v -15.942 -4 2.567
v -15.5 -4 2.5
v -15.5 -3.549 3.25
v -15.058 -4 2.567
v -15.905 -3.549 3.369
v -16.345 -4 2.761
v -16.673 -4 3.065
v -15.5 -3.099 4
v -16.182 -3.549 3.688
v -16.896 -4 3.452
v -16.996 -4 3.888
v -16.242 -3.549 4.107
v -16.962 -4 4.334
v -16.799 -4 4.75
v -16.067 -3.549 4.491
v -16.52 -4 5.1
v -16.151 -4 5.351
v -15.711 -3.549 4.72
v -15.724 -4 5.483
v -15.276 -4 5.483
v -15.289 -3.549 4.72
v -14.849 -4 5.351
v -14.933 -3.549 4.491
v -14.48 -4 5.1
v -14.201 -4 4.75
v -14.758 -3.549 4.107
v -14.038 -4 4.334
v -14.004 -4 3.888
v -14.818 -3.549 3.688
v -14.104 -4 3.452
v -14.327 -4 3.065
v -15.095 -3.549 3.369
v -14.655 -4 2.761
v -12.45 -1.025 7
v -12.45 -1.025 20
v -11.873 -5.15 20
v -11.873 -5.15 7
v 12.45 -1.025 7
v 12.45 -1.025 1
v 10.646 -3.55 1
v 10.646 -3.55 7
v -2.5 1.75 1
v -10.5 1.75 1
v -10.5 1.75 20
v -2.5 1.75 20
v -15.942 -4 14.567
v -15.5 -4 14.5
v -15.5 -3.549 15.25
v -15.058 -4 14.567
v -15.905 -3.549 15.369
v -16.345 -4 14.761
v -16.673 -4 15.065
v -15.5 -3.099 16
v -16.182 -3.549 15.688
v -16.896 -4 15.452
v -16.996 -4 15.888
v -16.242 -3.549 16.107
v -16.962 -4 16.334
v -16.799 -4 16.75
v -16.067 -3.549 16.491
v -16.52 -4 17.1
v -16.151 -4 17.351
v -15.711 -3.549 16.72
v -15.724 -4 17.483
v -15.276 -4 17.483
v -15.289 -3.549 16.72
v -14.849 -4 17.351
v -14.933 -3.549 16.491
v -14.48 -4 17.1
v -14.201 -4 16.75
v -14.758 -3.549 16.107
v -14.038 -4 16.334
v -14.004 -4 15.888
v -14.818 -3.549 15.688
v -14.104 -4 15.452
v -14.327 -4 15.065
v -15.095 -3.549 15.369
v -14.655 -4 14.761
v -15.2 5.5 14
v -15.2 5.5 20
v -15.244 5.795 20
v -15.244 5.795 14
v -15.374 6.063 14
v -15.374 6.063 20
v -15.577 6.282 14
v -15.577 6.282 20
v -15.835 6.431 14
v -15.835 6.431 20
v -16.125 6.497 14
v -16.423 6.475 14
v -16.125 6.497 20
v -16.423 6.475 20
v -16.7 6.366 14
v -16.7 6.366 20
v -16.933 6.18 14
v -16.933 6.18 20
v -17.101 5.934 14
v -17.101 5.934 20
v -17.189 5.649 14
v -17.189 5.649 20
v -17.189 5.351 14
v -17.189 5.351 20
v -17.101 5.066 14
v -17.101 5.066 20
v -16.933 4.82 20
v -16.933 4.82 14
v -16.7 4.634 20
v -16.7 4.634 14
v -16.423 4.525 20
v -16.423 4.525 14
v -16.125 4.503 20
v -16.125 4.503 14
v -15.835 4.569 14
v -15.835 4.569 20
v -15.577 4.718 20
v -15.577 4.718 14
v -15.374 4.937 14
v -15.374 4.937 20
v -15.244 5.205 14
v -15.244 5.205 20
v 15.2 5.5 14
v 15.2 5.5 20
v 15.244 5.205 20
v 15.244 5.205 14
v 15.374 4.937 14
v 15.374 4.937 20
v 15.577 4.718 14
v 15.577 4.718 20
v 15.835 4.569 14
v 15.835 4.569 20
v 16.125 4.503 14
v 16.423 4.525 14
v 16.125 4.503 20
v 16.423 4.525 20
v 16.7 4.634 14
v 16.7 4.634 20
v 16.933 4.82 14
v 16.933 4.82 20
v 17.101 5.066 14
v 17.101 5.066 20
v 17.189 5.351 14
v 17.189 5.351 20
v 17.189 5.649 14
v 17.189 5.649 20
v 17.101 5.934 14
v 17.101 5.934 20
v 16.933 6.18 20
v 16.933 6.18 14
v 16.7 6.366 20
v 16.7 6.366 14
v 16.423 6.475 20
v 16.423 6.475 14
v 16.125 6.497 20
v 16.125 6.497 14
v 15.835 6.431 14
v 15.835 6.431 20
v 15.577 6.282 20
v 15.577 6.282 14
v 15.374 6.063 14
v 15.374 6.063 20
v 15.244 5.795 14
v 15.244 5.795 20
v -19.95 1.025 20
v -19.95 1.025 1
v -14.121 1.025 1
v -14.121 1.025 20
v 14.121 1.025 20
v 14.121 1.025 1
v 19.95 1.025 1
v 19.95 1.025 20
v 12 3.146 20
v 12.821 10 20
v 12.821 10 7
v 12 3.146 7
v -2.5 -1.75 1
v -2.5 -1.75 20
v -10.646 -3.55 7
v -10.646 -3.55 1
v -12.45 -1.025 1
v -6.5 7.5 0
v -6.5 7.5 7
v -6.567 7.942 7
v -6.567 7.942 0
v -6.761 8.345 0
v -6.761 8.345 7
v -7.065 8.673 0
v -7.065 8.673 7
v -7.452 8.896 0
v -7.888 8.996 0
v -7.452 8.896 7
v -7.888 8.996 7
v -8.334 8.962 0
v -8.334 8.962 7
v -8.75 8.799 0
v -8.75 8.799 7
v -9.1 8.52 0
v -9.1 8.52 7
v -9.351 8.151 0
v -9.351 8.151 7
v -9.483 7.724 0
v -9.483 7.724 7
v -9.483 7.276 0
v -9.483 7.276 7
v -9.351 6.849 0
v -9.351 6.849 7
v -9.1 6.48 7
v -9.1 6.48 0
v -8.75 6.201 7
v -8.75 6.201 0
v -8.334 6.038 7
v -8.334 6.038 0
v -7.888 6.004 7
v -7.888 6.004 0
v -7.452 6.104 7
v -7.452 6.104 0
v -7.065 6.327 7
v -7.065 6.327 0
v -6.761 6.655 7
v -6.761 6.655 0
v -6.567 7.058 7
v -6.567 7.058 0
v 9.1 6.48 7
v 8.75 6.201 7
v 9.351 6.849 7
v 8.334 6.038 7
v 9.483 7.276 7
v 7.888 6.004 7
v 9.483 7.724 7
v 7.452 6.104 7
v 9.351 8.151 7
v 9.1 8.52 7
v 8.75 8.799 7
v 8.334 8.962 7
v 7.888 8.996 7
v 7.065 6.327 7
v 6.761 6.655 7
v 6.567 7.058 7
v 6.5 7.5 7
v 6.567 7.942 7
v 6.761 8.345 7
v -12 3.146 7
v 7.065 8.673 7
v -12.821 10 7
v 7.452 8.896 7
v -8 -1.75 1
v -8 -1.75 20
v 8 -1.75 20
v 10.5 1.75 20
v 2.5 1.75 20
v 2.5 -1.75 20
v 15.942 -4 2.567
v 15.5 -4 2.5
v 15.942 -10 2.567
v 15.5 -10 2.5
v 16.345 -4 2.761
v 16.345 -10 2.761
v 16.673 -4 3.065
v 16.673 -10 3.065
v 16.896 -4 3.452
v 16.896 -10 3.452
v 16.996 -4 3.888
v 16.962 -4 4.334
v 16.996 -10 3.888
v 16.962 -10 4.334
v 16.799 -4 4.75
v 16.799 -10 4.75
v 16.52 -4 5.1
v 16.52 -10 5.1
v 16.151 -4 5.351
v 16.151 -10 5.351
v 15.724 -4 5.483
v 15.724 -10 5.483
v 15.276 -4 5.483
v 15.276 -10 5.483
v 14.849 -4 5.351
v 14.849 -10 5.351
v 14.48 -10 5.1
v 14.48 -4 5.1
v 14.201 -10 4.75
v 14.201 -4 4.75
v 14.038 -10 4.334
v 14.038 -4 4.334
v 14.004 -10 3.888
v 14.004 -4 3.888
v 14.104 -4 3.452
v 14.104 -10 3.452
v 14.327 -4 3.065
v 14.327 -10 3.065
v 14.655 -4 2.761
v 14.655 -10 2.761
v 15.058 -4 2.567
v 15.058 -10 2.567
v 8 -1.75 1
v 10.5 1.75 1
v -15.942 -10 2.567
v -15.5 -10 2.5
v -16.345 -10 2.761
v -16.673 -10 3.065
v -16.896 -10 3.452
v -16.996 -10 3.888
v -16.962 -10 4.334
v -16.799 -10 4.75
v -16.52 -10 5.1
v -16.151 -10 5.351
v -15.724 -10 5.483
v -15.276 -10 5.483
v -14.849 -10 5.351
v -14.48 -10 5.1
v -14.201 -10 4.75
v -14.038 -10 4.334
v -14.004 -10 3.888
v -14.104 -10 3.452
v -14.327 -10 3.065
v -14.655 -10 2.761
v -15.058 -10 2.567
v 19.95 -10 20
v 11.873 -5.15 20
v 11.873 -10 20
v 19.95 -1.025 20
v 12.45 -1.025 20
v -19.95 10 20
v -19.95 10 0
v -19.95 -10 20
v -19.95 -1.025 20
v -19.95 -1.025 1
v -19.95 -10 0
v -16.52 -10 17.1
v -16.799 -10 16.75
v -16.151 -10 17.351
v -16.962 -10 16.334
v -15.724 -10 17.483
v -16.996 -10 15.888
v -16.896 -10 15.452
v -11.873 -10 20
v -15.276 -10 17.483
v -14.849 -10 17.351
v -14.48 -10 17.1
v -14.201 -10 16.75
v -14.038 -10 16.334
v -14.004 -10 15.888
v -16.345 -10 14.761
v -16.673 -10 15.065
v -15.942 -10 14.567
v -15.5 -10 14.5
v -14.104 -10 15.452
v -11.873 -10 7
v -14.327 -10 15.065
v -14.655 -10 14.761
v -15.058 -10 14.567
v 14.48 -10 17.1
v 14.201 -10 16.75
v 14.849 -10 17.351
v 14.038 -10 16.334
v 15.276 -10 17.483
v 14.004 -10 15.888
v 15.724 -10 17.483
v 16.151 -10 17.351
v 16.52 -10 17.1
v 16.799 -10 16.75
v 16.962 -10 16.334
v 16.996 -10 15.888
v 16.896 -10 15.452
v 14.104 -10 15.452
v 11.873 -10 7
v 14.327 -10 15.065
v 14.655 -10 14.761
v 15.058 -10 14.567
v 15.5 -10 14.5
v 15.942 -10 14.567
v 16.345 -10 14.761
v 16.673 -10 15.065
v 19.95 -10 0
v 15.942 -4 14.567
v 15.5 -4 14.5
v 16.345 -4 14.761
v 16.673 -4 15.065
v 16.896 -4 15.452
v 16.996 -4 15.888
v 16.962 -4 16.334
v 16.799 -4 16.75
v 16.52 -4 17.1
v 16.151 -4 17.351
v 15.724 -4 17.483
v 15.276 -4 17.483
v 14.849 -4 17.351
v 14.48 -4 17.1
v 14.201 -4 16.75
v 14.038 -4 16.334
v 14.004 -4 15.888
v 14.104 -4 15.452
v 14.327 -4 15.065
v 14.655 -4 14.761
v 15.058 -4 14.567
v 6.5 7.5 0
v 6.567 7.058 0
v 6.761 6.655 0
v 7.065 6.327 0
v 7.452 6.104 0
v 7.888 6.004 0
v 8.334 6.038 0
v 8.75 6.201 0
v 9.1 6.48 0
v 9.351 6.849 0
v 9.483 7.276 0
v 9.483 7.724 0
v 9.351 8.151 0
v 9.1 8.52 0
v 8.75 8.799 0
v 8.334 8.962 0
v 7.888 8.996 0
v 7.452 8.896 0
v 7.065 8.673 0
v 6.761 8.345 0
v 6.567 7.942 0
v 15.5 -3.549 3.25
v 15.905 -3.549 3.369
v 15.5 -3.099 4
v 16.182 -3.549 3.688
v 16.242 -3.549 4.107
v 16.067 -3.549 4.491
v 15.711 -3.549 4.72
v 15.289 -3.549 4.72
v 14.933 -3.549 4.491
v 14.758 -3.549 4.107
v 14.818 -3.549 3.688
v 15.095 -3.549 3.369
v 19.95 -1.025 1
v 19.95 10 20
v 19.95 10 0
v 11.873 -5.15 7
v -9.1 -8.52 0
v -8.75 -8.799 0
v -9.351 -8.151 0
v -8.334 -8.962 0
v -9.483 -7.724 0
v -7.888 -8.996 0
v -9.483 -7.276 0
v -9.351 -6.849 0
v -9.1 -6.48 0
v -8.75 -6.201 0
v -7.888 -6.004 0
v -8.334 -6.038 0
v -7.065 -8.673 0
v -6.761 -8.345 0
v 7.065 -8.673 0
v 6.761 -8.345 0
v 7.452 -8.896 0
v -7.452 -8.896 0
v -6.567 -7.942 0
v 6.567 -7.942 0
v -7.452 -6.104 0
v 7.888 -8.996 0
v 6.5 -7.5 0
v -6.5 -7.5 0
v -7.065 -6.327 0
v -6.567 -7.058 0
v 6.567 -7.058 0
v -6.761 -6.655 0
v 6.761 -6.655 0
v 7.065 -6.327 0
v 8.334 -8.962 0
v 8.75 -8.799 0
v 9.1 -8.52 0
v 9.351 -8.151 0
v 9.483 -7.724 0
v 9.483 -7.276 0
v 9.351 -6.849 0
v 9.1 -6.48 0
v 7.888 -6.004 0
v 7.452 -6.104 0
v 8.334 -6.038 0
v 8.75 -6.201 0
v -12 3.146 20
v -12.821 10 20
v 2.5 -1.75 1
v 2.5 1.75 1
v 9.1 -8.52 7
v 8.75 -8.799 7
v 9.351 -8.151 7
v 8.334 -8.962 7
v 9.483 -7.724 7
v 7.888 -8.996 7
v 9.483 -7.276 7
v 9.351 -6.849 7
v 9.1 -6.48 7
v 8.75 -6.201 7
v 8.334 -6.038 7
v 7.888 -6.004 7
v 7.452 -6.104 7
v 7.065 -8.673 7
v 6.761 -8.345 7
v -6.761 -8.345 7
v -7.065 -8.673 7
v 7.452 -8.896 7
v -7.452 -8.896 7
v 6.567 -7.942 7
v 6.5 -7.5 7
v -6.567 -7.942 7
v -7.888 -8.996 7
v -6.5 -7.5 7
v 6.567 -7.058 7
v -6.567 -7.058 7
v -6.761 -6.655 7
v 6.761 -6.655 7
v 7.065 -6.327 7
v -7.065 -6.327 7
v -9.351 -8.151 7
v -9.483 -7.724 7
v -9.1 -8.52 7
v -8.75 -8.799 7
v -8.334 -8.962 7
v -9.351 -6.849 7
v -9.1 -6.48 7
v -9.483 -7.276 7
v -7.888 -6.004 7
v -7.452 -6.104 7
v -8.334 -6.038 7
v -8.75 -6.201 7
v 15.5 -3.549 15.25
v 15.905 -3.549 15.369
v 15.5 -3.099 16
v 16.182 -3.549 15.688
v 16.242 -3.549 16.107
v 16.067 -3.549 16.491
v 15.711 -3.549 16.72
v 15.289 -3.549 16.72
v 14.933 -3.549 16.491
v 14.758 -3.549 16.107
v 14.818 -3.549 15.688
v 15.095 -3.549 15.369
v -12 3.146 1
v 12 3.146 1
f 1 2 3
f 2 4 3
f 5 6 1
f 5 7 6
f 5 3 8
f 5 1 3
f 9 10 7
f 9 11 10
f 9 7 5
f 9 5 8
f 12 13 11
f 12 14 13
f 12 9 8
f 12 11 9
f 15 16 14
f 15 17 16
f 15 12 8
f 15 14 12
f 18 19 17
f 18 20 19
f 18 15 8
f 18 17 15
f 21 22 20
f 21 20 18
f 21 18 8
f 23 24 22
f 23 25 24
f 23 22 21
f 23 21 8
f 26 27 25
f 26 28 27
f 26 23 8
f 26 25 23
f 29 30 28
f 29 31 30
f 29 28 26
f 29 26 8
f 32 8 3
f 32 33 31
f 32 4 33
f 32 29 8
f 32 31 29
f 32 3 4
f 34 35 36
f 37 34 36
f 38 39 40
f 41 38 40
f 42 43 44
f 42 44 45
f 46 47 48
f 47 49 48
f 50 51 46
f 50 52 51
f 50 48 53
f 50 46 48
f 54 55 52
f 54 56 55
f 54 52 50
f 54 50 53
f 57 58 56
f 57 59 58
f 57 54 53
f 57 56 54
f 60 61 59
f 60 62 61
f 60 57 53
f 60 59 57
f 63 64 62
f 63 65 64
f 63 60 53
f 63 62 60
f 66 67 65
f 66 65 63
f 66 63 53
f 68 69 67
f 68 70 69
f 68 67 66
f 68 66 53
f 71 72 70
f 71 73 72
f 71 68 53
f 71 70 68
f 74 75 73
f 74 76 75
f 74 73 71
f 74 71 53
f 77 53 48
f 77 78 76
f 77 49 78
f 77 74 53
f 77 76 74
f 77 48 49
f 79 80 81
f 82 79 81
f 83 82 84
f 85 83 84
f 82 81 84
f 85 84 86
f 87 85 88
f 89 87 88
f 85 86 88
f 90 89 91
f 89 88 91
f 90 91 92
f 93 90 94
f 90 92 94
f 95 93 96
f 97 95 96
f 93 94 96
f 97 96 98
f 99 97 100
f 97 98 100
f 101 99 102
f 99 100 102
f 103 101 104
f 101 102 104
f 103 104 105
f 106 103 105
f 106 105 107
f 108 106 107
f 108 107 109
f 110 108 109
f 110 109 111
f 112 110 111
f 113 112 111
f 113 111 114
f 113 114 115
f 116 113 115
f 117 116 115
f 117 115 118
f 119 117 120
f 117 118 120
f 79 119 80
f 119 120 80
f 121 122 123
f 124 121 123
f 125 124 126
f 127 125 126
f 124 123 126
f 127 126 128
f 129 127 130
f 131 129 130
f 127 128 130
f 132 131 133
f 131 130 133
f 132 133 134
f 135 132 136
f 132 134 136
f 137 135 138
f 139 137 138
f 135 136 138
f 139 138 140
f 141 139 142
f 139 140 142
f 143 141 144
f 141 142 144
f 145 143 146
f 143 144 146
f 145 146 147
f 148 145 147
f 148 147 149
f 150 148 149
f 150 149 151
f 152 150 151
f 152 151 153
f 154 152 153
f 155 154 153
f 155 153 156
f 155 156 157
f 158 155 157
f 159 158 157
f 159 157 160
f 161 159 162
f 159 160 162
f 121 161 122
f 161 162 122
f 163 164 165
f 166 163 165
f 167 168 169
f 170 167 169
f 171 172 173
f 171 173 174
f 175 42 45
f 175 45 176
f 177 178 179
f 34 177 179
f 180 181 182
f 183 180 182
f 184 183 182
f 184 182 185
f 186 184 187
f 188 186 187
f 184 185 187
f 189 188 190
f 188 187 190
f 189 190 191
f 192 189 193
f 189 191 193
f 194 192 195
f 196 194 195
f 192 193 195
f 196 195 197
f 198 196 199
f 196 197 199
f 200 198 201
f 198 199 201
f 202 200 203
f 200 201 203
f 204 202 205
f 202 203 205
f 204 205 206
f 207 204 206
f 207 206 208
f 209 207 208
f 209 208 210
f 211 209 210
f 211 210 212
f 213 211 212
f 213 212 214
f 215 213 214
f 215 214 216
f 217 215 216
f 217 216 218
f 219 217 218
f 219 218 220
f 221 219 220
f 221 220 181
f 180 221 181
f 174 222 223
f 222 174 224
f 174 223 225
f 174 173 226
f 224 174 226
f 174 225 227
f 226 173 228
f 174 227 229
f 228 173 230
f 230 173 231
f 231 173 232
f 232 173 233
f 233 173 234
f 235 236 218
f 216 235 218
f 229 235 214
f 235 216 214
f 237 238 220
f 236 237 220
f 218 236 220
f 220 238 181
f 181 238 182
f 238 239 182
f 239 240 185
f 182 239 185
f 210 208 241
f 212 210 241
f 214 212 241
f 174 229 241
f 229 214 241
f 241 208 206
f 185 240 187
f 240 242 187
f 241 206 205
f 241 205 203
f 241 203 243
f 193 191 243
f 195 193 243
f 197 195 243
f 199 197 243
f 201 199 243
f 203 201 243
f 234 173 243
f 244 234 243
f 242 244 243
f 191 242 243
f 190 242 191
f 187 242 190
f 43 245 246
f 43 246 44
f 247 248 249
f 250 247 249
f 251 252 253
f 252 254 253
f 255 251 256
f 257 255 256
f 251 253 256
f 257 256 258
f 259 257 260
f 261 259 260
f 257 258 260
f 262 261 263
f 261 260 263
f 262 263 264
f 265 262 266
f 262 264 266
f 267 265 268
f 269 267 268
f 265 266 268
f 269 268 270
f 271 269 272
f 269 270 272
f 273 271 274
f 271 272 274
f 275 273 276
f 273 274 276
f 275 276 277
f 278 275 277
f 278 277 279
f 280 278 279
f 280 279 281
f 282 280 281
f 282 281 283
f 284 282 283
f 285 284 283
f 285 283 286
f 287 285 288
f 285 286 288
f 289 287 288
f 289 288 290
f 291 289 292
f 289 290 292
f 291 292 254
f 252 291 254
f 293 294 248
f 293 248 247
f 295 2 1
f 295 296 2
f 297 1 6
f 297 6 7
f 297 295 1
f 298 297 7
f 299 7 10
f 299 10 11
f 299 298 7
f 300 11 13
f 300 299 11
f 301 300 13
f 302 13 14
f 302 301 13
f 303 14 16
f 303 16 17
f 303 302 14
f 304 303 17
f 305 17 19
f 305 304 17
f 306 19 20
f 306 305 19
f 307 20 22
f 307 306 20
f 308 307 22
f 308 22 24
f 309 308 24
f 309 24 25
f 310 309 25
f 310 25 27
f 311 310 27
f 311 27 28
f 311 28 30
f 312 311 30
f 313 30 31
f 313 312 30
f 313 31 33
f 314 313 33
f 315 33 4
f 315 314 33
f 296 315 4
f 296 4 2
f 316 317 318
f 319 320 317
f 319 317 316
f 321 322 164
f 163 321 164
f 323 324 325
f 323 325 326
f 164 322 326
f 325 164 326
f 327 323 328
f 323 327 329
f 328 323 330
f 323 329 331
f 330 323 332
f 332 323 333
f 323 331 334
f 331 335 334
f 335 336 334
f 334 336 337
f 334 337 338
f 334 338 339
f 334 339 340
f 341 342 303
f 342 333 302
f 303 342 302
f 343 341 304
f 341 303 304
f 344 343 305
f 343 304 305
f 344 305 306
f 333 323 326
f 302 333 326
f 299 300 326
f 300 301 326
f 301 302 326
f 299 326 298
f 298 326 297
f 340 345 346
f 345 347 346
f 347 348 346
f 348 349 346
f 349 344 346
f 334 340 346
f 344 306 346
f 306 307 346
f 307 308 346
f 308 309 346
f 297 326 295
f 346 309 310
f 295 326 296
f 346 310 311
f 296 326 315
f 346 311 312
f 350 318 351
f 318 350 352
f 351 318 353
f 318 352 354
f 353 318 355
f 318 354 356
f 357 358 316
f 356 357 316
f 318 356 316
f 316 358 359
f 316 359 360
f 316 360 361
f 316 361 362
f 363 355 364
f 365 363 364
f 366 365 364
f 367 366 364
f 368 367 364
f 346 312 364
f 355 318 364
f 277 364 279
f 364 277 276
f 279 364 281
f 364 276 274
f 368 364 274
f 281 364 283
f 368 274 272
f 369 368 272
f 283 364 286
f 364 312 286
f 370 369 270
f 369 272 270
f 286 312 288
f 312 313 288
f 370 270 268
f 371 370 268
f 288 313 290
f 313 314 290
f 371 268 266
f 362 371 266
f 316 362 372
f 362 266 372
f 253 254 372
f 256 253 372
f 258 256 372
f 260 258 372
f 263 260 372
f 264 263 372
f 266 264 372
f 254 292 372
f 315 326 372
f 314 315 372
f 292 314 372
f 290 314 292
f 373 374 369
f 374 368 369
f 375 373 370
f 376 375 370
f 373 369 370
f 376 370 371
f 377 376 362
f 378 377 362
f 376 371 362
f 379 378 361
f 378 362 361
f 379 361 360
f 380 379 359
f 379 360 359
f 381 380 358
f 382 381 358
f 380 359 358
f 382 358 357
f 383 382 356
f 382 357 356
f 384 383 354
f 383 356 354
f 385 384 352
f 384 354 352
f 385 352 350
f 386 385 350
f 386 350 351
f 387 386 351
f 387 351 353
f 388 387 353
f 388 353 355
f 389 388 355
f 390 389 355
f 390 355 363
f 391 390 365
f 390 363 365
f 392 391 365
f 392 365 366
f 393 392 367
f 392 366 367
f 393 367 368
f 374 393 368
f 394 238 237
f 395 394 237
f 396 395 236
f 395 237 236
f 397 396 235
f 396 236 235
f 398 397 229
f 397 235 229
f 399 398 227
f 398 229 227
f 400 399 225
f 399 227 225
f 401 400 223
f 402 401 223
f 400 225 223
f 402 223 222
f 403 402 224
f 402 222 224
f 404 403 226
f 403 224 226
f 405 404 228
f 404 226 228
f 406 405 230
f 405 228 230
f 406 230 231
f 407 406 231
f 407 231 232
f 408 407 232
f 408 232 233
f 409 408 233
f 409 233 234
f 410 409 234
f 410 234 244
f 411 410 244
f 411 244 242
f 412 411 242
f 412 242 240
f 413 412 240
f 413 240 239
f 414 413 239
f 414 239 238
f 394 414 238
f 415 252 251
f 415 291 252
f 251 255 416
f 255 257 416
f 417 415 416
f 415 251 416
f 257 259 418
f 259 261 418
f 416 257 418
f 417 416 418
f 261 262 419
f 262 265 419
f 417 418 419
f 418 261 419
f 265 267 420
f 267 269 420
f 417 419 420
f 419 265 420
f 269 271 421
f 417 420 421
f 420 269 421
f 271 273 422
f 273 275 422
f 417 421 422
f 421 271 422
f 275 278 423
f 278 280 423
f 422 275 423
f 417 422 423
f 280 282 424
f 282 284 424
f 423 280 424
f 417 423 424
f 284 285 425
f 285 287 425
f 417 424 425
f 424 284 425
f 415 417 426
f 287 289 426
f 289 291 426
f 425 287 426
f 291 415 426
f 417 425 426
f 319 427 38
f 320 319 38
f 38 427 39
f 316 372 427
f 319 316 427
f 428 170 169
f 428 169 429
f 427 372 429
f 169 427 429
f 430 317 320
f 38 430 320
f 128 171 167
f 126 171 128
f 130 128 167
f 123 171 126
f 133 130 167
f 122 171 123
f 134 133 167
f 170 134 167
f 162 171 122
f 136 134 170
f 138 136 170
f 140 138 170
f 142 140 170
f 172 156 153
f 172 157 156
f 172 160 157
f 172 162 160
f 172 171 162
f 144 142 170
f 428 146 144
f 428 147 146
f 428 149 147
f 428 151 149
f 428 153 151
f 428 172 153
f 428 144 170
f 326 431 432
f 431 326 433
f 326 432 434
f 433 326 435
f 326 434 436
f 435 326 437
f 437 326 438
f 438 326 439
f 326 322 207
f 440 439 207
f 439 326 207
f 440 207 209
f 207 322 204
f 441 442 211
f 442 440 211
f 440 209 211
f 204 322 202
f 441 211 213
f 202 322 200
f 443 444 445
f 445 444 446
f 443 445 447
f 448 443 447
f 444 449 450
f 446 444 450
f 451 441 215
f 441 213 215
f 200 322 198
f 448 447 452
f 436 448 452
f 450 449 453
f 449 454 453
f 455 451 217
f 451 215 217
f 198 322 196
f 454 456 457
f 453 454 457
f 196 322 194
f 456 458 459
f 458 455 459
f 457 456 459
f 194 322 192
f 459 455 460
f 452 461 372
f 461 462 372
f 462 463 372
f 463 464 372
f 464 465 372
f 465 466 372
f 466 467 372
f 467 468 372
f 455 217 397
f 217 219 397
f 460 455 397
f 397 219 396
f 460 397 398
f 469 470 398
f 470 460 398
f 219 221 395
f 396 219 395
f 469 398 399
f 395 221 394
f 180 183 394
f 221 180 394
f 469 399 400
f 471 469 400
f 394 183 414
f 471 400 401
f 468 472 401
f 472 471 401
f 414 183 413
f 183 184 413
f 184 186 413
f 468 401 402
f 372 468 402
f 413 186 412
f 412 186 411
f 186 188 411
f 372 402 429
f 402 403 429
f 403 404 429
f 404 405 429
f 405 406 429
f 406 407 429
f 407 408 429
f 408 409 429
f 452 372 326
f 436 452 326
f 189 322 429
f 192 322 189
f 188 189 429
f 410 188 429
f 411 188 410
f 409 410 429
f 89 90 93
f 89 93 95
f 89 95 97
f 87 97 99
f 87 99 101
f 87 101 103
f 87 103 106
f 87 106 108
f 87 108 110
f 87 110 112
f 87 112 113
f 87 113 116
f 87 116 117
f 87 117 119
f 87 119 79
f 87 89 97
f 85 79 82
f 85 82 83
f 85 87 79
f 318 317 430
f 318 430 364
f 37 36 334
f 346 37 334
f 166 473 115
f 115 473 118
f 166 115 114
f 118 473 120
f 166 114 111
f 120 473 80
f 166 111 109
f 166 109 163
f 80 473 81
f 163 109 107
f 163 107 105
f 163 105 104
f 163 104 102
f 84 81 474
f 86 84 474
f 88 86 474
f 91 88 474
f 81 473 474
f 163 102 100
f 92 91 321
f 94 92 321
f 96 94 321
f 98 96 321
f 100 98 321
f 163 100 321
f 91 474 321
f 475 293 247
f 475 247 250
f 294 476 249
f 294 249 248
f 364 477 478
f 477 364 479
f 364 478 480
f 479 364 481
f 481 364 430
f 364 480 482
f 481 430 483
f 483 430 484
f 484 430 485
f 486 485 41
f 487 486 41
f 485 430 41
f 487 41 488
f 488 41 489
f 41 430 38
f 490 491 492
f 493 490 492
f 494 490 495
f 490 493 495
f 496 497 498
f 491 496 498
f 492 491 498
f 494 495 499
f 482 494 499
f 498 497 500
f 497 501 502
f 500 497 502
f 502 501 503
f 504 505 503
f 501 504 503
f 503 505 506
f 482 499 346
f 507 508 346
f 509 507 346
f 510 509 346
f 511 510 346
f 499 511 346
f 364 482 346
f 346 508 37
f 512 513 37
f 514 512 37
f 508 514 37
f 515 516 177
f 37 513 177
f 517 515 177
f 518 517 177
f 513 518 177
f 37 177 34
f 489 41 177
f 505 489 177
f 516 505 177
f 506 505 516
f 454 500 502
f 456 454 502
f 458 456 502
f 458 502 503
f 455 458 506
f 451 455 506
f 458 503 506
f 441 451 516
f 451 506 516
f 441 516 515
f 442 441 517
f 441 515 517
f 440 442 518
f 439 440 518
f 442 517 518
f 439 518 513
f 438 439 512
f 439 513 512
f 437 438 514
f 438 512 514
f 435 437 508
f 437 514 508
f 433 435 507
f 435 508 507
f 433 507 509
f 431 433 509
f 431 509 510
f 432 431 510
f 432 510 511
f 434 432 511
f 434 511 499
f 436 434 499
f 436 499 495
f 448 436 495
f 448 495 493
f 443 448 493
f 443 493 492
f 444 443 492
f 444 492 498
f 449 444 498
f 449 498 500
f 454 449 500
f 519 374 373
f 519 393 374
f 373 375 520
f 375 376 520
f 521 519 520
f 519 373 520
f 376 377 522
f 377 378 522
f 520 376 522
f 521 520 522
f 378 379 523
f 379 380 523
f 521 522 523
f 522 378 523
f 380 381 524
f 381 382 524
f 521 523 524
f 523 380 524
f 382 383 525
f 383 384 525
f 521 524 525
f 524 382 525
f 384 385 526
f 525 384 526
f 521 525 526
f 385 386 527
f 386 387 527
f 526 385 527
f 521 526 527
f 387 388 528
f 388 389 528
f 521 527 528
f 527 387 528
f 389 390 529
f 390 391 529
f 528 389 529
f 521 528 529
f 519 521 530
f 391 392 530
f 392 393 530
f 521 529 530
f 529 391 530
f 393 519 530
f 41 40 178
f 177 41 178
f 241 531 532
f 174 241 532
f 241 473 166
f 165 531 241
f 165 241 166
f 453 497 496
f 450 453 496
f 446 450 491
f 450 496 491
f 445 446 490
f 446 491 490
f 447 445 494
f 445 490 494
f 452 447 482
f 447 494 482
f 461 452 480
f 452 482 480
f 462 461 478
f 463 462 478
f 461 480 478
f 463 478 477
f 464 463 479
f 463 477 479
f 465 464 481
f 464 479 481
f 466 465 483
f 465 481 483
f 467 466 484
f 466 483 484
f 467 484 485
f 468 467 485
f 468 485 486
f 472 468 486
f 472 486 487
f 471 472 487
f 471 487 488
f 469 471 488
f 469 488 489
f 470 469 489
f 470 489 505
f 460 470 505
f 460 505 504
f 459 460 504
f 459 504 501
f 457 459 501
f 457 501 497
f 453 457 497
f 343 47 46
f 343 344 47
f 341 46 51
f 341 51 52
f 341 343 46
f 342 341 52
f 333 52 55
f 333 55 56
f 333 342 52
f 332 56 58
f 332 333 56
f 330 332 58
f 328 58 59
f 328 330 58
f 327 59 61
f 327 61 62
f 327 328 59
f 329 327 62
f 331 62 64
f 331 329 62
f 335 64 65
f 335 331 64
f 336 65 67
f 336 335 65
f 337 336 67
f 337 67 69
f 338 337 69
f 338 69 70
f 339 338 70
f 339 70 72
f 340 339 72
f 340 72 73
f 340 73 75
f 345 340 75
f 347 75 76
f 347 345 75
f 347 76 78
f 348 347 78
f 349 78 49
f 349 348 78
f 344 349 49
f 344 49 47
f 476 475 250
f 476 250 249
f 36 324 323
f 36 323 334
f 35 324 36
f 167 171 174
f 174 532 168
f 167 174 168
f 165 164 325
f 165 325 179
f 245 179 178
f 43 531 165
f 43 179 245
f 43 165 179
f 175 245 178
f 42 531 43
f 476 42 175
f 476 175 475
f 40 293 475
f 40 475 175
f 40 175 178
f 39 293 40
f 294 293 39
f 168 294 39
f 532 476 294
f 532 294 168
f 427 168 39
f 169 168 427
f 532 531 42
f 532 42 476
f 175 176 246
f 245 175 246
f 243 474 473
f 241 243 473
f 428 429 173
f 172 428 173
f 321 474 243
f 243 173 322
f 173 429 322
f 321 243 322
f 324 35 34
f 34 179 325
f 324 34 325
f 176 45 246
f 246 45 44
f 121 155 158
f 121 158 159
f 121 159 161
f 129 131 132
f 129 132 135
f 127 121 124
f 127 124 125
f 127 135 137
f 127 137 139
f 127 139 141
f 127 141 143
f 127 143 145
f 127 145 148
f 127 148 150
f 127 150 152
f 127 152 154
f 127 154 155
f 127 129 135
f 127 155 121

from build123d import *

# Parameters (mm, degrees)
SKETCH_1_W           = 39.9
SKETCH_1_H           = 20
EXTRUDE_1_DEPTH      = 1
EXTRUDE_4_DEPTH      = 19
CUT_EXTRUDE_1_DEPTH  = 13
F_3_0MM_3_AT_2_COUNT = 2
F_3_0MM_3_AT_2_PITCH = 12
EXTRUDE_5_DEPTH      = 13
CUT_EXTRUDE_2_DEPTH  = 13
SKETCH_27_R          = 1
CUT_EXTRUDE_3_DEPTH  = 6
SKETCH_28_R          = 1.5
CUT_EXTRUDE_4_DEPTH  = 26.82639154


with BuildPart() as part:
    # 草图1 → 凸台-拉伸1 (new body)
    with BuildSketch(Plane.XY):
        Rectangle(SKETCH_1_W, SKETCH_1_H)
    extrude(amount=EXTRUDE_1_DEPTH)

    # 草图2 → 凸台-拉伸4 (add)
    with BuildSketch(Plane.XY.offset(1)):
        Polygon((-19.95, 10), (-19.95, 1.025), (-14.121320344, 1.025), (-12, 3.146320344), (0, 3.146320344), (0, 10), align=None)
        Polygon((19.95, 10), (0, 10), (0, 3.146320344), (12, 3.146320344), (14.121320344, 1.025), (19.95, 1.025), align=None)
        Polygon((-8, -1.75), (-10.5, 1.75), (-2.5, 1.75), (-2.5, -1.75), align=None)
        Polygon((2.5, -1.75), (2.5, 1.75), (10.5, 1.75), (8, -1.75), align=None)
        Polygon((-12.45, -1.025), (-19.95, -1.025), (-19.95, -10), (19.95, -10), (19.95, -1.025), (12.45, -1.025), (10.646428571, -3.55), (-10.646428571, -3.55), align=None)
    extrude(amount=EXTRUDE_4_DEPTH)

    # 草图4 → 切除-拉伸1 (cut)
    with BuildSketch(Plane.XY.offset(20)):
        Polygon((-12.45, -1.025), (-11.193517665, -10), (0, -13.387486255), (11.193517665, -10), (12.45, -1.025), (10.646428571, -3.55), (-10.646428571, -3.55), align=None)
        Polygon((-14.121320344, 1.025), (-12.45, 12.563933046), (12.45, 12.563933046), (14.121320344, 1.025), (12, 3.146320344), (-12, 3.146320344), align=None)
    extrude(amount=-CUT_EXTRUDE_1_DEPTH, mode=Mode.SUBTRACT)

    # 草图22 → Ø3.0mm 暗销孔3 (revolve, cut)
    with BuildSketch(Plane(origin=(-15.5, -10, 16), x_dir=(0, 0, -1), z_dir=(1, 0, 0))):
        Polygon((0, 0), (0, 6.901290929), (1.5, 6), (1.5, 0), align=None)
    f_3_0mm_3 = revolve(axis=Axis((-15.5, -16.35, 16), (0, 1, 0)), mode=Mode.SUBTRACT)

    # Ø3.0mm 暗销孔3 at 2: Ø3.0mm 暗销孔3 ×2
    with Locations(*[(0, 0, -i * F_3_0MM_3_AT_2_PITCH) for i in range(1, F_3_0MM_3_AT_2_COUNT)]):
        add(f_3_0mm_3, mode=Mode.SUBTRACT)

    # 镜向3: Ø3.0mm 暗销孔3 across plane
    add(f_3_0mm_3.mirror(Plane(origin=(0, 0, 0), x_dir=(0, 0, 1), z_dir=(1, 0, 0))), mode=Mode.SUBTRACT)

    # 镜向3 copy 1 sketch → 镜向3 copy 1 (revolve, cut)
    with BuildSketch(Plane(origin=(15.5, -10, 4), x_dir=(0, 0, -1), z_dir=(-1, 0, 0))):
        Polygon((0, 0), (0, -6.901290929), (1.5, -6), (1.5, 0), align=None)
    revolve(axis=Axis((15.5, -16.35, 4), (0, -1, 0)), mode=Mode.SUBTRACT)

    # 草图25 → 凸台-拉伸5 (add)
    with BuildSketch(Plane.XY.offset(7)):
        Polygon((-12.821364791, 10), (-12, 3.146320344), (-14.121320344, 1.025), align=None)
        Polygon((12, 3.146320344), (14.121320344, 1.025), (12.821364791, 10), align=None)
    extrude(amount=EXTRUDE_5_DEPTH)

    # 草图26 → 切除-拉伸2 (cut)
    with BuildSketch(Plane.XY.offset(20)):
        Polygon((-11.872508119, -5.15), (-11.872508119, -10), (-11.193517665, -10), align=None)
        Polygon((11.193517665, -10), (11.872508119, -5.15), (11.872508119, -10), align=None)
    extrude(amount=-CUT_EXTRUDE_2_DEPTH, mode=Mode.SUBTRACT)

    # 草图27 → 切除-拉伸3 (cut)
    with BuildSketch(Plane.XY.offset(20)):
        with Locations((-16.2, 5.5)):
            Circle(SKETCH_27_R)
        with Locations(Location((16.2, 5.5, 0), (0, 0, 180))):
            Circle(SKETCH_27_R)
    extrude(amount=-CUT_EXTRUDE_3_DEPTH, mode=Mode.SUBTRACT)

    # 草图28 → 切除-拉伸4 (cut, through all)
    with BuildSketch(Plane.XY.offset(7)):
        with Locations((-8, 7.5)):
            Circle(SKETCH_28_R)
        with Locations((-8, -7.5)):
            Circle(SKETCH_28_R)
        with Locations(Location((8, -7.5, 0), (0, 0, 180))):
            Circle(SKETCH_28_R)
        with Locations(Location((8, 7.5, 0), (0, 0, 180))):
            Circle(SKETCH_28_R)
    extrude(amount=-CUT_EXTRUDE_4_DEPTH, mode=Mode.SUBTRACT)


solid = part.part
